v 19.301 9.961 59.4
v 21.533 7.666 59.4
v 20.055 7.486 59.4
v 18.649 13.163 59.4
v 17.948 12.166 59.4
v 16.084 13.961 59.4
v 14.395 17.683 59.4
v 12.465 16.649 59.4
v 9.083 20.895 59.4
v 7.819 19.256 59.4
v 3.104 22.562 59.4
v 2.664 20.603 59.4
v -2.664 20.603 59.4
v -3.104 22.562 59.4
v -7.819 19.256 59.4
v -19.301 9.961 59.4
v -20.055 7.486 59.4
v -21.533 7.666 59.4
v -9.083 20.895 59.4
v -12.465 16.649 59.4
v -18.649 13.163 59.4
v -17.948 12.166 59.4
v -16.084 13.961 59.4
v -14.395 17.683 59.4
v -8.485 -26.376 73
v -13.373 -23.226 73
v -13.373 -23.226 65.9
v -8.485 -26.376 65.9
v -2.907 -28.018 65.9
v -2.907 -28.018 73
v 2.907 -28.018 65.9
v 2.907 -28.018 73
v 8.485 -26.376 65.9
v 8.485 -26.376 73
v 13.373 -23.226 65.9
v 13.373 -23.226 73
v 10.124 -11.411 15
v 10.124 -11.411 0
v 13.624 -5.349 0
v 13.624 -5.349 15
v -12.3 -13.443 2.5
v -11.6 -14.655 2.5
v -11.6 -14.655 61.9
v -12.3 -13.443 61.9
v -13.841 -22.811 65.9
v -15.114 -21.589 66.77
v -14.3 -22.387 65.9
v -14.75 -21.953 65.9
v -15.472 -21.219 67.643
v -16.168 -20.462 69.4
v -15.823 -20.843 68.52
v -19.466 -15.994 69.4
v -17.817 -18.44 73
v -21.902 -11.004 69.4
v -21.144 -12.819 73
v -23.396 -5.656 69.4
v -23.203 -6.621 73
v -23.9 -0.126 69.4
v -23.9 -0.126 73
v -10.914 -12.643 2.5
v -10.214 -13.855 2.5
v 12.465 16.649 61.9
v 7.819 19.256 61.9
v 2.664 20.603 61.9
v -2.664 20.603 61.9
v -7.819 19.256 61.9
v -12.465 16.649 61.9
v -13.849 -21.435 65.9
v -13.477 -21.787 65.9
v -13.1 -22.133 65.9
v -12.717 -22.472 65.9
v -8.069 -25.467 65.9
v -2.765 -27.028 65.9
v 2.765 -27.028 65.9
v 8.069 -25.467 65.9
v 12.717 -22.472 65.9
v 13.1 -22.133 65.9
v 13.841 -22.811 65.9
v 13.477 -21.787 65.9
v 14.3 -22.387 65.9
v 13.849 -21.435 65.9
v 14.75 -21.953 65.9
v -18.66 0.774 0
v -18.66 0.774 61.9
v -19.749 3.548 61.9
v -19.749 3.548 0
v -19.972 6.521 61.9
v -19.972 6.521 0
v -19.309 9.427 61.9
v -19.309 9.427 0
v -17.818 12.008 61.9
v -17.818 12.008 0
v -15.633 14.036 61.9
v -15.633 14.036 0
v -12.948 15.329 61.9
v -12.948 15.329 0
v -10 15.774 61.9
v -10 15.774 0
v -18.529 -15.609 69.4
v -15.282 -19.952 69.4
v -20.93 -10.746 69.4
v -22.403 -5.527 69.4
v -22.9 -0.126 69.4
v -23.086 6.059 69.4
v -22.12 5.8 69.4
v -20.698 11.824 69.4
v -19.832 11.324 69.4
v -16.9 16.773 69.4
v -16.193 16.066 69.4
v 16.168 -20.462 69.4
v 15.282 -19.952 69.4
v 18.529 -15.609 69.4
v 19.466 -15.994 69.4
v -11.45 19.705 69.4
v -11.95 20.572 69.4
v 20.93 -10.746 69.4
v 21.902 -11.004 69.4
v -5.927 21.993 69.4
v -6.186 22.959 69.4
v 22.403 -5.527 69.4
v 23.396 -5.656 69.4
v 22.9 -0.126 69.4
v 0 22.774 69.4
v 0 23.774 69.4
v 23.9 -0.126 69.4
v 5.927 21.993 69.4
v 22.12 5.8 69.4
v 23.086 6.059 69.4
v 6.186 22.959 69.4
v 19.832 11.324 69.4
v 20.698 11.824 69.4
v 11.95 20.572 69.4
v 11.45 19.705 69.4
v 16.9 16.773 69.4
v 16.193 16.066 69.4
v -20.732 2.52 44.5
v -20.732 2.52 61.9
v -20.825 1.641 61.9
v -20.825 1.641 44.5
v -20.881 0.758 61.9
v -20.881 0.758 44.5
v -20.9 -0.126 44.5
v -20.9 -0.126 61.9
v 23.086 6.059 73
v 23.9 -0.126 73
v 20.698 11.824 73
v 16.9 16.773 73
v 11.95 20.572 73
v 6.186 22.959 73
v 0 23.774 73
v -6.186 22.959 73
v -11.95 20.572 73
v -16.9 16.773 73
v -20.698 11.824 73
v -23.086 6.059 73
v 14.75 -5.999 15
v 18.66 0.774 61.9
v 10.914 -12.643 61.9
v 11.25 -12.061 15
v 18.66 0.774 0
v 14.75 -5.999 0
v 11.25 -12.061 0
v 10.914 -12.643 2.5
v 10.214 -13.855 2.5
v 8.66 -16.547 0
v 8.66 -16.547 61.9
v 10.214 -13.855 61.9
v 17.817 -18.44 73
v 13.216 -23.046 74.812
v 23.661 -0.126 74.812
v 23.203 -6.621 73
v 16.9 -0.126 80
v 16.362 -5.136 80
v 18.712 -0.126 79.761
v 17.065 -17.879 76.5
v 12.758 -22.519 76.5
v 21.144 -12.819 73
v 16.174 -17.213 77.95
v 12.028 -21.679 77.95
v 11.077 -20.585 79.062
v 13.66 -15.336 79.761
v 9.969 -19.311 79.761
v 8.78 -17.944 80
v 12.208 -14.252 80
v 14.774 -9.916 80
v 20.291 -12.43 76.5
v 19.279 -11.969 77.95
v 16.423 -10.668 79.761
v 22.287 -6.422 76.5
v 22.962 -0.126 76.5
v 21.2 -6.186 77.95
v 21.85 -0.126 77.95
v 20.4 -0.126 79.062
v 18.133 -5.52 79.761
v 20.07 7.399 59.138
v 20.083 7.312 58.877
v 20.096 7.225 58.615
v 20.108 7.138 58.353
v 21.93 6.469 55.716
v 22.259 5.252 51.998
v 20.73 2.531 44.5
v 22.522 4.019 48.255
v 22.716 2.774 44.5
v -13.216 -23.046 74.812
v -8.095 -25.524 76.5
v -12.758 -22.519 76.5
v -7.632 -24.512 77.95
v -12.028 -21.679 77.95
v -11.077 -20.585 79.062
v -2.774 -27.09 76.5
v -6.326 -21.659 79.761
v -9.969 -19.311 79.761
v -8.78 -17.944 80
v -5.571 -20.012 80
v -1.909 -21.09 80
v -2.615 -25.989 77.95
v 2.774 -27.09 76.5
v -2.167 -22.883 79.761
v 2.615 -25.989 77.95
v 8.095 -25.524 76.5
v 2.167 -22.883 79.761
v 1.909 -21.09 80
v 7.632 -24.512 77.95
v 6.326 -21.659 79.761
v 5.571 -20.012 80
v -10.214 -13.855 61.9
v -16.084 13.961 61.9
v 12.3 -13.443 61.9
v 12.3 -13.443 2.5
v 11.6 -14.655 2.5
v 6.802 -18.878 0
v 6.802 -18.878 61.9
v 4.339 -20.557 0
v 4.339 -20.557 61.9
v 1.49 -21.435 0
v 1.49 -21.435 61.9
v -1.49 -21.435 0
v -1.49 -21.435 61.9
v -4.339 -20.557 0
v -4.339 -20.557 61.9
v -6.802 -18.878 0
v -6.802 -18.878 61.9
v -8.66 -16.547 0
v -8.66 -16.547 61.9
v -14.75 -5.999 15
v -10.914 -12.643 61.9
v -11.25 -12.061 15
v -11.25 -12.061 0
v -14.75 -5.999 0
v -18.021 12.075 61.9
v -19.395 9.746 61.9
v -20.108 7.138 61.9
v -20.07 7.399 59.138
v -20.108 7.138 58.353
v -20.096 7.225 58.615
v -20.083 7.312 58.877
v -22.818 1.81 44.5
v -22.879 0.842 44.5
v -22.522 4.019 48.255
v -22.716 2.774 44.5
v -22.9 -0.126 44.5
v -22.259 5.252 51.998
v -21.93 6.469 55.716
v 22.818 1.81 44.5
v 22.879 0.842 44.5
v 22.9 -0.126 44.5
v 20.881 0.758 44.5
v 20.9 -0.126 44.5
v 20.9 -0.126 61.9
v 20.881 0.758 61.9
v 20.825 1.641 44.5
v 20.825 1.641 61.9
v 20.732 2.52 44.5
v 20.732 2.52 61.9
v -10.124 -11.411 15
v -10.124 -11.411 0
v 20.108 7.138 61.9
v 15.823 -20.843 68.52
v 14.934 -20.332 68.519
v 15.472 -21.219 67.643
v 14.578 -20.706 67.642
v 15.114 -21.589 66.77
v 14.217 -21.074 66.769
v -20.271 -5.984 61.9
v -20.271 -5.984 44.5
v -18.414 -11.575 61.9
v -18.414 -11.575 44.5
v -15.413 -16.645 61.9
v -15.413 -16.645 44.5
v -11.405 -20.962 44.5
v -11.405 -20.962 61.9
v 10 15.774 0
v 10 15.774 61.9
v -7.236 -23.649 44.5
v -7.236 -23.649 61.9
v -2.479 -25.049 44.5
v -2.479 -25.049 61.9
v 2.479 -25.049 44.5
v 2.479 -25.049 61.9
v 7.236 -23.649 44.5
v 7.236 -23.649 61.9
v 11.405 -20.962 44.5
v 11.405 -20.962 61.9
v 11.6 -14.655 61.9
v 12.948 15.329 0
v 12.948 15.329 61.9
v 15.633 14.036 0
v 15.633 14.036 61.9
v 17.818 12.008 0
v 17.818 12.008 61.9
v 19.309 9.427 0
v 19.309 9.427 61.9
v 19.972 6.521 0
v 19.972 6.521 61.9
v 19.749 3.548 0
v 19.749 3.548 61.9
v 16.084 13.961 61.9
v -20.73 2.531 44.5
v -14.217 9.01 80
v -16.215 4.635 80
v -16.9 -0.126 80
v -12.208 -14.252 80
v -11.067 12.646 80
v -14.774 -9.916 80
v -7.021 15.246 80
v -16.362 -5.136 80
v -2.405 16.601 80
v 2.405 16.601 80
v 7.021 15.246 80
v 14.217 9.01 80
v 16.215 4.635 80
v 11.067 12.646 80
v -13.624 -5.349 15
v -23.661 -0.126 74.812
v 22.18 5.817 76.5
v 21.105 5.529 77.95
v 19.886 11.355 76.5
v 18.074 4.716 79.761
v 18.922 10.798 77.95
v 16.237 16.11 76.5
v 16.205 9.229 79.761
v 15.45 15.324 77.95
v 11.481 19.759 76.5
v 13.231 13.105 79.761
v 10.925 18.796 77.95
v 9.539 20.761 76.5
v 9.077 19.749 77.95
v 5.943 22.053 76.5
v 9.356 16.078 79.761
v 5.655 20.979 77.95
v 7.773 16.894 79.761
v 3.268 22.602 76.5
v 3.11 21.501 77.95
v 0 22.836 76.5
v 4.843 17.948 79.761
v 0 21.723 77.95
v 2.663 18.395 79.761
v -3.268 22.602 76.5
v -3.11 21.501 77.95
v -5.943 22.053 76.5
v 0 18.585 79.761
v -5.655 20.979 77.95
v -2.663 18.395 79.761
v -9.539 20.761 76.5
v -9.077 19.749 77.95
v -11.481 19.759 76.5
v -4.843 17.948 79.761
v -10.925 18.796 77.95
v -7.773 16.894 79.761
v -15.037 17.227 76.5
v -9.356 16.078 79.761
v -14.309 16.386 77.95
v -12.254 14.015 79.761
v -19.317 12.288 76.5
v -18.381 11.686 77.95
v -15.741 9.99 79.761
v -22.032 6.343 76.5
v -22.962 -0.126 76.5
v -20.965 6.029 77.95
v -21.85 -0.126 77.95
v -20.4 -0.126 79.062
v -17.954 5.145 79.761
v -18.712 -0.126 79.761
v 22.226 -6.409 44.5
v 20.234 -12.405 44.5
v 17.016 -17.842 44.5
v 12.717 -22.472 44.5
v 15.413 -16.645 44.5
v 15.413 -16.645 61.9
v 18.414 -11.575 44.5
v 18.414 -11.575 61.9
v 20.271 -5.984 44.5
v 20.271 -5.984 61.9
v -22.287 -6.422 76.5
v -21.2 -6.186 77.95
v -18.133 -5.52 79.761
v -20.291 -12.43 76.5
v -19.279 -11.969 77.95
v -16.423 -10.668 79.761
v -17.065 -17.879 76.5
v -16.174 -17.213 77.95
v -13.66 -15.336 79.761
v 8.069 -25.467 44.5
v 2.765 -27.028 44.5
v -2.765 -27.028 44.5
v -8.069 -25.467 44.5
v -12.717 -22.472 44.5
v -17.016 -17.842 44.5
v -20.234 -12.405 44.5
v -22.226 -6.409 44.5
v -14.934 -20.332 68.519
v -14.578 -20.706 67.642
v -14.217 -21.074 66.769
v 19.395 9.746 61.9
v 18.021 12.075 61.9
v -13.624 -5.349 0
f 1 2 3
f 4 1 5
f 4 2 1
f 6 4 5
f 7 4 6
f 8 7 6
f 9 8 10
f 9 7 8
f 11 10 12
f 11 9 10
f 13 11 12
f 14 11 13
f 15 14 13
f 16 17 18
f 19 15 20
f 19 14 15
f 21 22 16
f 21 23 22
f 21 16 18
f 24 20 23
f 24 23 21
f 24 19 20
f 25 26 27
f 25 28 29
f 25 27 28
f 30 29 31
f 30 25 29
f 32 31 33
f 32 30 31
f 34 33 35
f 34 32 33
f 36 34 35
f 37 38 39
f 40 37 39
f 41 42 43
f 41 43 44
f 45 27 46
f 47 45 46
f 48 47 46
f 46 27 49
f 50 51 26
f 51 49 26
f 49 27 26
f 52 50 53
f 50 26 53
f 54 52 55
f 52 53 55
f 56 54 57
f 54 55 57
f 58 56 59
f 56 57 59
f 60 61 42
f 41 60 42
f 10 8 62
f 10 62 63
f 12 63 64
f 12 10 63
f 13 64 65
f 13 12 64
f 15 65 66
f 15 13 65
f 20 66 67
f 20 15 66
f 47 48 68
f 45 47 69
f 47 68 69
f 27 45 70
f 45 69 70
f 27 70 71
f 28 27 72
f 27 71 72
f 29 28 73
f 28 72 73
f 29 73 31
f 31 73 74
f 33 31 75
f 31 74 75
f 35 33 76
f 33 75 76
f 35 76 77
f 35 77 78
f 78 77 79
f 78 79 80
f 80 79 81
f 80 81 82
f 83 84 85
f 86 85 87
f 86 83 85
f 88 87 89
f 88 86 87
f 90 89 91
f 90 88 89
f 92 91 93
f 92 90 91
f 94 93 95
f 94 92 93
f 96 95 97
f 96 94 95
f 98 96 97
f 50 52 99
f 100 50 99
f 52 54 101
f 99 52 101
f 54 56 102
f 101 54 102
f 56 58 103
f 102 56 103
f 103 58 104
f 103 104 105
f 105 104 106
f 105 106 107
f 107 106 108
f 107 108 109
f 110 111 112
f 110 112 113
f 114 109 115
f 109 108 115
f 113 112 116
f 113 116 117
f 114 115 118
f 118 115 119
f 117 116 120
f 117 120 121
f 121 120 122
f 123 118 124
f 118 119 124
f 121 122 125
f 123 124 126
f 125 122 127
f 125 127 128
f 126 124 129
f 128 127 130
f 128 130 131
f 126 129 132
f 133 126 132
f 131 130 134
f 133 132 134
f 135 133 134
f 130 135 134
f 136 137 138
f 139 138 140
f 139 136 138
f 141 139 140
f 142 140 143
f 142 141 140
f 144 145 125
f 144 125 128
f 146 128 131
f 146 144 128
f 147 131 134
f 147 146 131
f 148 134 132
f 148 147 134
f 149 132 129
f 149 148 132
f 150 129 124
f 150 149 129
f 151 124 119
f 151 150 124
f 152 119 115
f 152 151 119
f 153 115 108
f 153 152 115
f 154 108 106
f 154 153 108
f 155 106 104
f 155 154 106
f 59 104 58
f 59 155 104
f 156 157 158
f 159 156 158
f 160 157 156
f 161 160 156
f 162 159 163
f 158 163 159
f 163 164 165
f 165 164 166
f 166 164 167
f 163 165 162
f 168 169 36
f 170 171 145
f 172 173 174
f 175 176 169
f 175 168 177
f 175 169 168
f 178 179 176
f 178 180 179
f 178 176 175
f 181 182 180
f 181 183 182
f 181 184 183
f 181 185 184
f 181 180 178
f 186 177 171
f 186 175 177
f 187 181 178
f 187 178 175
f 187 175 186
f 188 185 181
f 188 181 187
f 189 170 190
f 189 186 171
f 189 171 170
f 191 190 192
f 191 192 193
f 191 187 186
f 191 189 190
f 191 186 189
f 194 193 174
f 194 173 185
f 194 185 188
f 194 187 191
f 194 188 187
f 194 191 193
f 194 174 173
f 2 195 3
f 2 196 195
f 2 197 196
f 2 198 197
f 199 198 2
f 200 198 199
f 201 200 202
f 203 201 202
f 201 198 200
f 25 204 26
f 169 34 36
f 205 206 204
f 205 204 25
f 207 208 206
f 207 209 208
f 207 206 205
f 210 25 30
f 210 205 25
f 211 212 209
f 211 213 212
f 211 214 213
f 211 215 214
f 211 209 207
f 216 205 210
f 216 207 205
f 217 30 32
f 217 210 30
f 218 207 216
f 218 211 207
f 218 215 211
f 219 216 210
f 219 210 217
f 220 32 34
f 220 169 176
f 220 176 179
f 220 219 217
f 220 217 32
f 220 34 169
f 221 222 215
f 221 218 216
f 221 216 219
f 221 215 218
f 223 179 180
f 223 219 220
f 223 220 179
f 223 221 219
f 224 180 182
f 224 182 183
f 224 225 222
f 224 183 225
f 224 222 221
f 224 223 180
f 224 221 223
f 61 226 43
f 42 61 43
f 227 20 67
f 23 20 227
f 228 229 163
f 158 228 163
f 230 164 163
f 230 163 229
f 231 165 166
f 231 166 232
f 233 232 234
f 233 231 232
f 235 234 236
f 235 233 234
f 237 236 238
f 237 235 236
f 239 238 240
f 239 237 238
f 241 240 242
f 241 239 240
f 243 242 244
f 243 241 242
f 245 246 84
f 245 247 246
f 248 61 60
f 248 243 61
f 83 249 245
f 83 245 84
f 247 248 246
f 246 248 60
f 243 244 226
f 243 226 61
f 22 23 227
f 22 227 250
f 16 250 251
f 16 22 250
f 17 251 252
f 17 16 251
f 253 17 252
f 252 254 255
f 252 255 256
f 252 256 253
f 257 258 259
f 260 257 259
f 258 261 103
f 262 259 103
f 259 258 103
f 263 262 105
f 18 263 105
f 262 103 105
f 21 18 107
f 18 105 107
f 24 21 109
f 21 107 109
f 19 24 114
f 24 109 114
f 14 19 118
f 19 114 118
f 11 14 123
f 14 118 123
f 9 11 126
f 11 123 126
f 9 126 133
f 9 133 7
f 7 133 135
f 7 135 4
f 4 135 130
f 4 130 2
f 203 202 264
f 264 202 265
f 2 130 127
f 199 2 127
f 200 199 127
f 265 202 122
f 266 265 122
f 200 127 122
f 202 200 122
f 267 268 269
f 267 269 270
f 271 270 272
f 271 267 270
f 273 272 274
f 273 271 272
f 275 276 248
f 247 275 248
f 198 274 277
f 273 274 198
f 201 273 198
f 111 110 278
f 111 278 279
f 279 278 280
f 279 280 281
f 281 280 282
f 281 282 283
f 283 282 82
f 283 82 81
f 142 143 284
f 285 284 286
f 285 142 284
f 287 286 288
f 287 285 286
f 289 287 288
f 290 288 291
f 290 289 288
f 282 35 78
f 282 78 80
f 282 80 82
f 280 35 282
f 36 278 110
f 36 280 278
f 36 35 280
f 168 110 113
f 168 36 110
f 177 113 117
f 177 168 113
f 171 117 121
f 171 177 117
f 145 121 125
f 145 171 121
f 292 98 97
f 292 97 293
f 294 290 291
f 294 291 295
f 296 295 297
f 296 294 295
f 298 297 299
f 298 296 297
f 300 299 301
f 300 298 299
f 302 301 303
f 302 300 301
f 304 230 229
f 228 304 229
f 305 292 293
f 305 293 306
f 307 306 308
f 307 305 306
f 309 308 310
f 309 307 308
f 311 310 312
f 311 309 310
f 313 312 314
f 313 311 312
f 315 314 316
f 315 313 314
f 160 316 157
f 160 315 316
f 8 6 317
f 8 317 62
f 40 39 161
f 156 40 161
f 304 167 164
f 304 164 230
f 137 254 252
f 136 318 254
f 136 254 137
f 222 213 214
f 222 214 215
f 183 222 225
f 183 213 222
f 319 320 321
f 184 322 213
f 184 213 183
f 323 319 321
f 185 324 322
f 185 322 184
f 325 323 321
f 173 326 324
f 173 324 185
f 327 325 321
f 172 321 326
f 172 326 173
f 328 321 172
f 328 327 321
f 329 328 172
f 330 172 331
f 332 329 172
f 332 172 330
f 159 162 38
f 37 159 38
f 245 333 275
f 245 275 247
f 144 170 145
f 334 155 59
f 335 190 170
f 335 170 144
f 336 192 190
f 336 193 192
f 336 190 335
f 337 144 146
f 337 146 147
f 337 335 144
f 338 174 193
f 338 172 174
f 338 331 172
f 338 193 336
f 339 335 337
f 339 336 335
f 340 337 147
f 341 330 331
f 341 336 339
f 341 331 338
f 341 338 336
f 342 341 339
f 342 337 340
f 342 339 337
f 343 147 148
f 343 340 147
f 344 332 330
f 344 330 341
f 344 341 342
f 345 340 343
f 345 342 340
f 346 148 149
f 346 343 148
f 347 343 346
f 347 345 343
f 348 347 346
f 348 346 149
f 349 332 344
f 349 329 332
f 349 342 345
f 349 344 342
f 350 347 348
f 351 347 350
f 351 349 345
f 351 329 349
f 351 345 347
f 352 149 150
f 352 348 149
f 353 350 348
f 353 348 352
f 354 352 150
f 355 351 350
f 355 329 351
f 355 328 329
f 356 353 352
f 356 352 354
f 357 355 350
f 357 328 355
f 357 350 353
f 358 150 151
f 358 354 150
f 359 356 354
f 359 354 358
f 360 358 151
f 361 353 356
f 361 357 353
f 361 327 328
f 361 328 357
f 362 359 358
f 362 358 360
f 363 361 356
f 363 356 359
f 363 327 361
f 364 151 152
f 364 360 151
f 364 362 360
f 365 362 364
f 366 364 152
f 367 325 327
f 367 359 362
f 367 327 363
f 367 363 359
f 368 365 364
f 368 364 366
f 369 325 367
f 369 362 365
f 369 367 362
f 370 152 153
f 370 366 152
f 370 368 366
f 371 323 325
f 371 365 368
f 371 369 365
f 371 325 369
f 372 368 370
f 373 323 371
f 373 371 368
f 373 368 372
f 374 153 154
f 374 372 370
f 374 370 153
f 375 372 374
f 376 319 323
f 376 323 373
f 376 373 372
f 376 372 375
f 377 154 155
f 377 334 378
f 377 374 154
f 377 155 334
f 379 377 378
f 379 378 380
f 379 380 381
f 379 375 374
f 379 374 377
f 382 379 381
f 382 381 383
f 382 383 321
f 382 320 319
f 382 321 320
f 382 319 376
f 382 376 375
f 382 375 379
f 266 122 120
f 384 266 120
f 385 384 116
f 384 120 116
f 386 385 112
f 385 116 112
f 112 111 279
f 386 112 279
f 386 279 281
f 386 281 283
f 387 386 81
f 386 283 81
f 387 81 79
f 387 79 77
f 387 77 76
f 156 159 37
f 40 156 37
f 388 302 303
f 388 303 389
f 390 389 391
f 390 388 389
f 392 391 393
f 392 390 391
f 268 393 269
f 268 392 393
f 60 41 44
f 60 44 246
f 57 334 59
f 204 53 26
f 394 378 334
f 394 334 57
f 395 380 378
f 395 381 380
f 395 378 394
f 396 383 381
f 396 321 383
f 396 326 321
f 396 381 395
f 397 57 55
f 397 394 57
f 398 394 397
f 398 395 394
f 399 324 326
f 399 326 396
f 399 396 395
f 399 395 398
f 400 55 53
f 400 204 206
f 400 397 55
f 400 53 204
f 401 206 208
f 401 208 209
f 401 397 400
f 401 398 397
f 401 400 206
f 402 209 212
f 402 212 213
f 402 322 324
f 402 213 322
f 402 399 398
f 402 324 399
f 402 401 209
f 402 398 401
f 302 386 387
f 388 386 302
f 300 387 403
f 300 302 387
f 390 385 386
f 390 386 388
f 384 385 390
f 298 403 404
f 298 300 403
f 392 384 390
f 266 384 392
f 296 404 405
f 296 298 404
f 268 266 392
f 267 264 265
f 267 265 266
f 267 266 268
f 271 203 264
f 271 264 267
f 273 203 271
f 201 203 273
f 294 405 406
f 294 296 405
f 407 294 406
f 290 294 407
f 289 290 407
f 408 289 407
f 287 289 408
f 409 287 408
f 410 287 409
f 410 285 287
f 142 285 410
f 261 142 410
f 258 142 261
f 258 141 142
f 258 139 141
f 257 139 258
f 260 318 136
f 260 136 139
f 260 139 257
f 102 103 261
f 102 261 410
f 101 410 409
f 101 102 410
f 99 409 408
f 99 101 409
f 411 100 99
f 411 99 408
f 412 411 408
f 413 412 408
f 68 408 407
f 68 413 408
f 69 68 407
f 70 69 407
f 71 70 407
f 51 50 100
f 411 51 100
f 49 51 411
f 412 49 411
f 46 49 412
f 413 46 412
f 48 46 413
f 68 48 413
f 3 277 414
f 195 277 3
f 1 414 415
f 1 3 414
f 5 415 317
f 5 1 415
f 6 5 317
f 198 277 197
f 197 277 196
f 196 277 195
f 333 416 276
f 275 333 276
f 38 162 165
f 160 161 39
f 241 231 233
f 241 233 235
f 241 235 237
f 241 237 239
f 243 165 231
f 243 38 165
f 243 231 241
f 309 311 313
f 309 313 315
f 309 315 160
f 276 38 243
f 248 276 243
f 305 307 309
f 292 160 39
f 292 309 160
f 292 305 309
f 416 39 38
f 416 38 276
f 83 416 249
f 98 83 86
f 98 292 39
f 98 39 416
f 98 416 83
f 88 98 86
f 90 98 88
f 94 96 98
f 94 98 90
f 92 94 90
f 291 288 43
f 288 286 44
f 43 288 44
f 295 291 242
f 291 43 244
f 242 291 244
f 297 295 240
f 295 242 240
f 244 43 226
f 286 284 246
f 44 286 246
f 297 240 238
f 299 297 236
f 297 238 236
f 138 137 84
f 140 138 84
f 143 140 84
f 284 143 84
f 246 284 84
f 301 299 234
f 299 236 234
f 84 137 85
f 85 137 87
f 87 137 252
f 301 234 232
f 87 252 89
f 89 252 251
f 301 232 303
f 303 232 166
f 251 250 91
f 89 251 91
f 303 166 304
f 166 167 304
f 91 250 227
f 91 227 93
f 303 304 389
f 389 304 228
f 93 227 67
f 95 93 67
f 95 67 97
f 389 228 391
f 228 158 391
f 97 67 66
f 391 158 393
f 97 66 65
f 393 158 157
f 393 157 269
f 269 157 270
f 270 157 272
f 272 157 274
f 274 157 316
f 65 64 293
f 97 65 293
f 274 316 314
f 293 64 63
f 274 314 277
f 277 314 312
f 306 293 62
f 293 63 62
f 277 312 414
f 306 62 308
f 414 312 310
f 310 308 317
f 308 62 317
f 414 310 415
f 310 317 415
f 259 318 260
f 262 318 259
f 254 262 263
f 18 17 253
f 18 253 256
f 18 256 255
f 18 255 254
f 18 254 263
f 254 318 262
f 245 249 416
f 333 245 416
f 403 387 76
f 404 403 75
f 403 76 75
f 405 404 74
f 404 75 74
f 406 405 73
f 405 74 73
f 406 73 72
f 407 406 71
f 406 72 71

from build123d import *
from OCP.BRepFilletAPI import BRepFilletAPI_MakeChamfer

# Parameters (mm, degrees)
BOSS_EXTRU_1_DEPTH      = 80
BOSS_EXTRU_2_DEPTH      = 10.6
BOSS_EXTRU_3_DEPTH      = 10
BOSS_EXTRU_4_DEPTH      = 3.5
CHANFREIN1_SIZE         = 2
CHANFREIN1_SIZE_2       = 3.5
BOSS_EXTRU_5_DEPTH      = 14.9
CHANFREIN2_SIZE         = 5
CHANFREIN2_SIZE_2       = 14.9
ENL_V_MAT_EXTRU_1_DEPTH = 61.9
BOSS_EXTRU_8_REACH      = 92.636
BOSS_EXTRU_8_START      = -2.5
ENL_V_MAT_EXTRU_4_DEPTH = 15
CONG_1_R                = 7


with BuildPart() as part:
    # Esquisse1 → Boss.-Extru.1 (new body)
    with BuildSketch(Plane.XY):
        with BuildLine():
            Line((-9.999999999999973, 15.773502691896244), (9.999999999999973, 15.773502691896244))
            ThreePointArc((9.999999999999973, 15.773502691896244), (18.66025403784436, 10.773502691896228), (18.66025403784438, 0.7735026918962024))
            Line((18.66025403784438, 0.7735026918962024), (8.660254037844393, -16.54700538379251))
            ThreePointArc((8.660254037844393, -16.54700538379251), (-4.87e-15, -21.5470053837925), (-8.660254037844393, -16.54700538379251))
            Line((-8.660254037844393, -16.54700538379251), (-18.66025403784438, 0.7735026918962024))
            ThreePointArc((-18.66025403784438, 0.7735026918962024), (-18.66025403784441, 10.773502691896235), (-9.999999999999973, 15.773502691896244))
        make_face()
    extrude(amount=BOSS_EXTRU_1_DEPTH)

    # Esquisse2 → Boss.-Extru.2 (add)
    with BuildSketch(Plane.XY.offset(80)):
        with BuildLine():
            Line((0, 23.773502691896258), (0, -28.226497308103742))
            ThreePointArc((0, -28.226497308103742), (-7.138520611844601, -26.935621886911633), (-13.372879499304581, -23.22649730810374))
            ThreePointArc((-13.372879499304581, -23.22649730810374), (-21.14415675858487, -12.819312855059437), (-23.89999999999999, -0.12649730810374363))
            ThreePointArc((-23.89999999999999, -0.12649730810374363), (-16.89985207035848, 16.773354762254744), (0, 23.773502691896258))
        make_face()
    boss_extru_2 = extrude(amount=-BOSS_EXTRU_2_DEPTH)

    # Symétrie1: Boss.-Extru.2 across plane
    add(boss_extru_2.mirror(Plane(origin=(0, 0, 0), x_dir=(0, 0, 1), z_dir=(1, 0, 0))))

    # Esquisse4 → Boss.-Extru.3 (add)
    with BuildSketch(Plane(origin=(0, 0, 69.4), x_dir=(-1, 0, 0), z_dir=(0, 0, -1))):
        with BuildLine():
            ThreePointArc((-12.716812029717252, -22.471795065262707), (-2.04e-15, -27.226497308103735), (12.71681202971725, -22.4717950652627))
            ThreePointArc((12.71681202971725, -22.4717950652627), (20.2341931687673, -12.404624700892555), (22.899999999999995, -0.12649730810373652))
            ThreePointArc((22.899999999999995, -0.12649730810373652), (-6.91e-15, 22.773502691896258), (-22.899999999999995, -0.12649730810373735))
            ThreePointArc((-22.899999999999995, -0.12649730810373735), (-20.234193168767305, -12.404624700892553), (-12.716812029717252, -22.471795065262707))
        make_face()
    extrude(amount=BOSS_EXTRU_3_DEPTH)

    # Esquisse6 → Boss.-Extru.4 (add)
    with BuildSketch(Plane(origin=(0, 0, 69.4), x_dir=(-1, 0, 0), z_dir=(0, 0, -1))):
        with BuildLine():
            Line((14.75, -21.95321690393977), (0, -13.476497308103742))
            Line((0, -13.476497308103742), (0, -28.226497308103742))
            ThreePointArc((0, -28.226497308103742), (7.138520611844594, -26.935621886911633), (13.372879499304576, -23.226497308103735))
            ThreePointArc((13.372879499304576, -23.226497308103735), (14.071194795630928, -22.600407707254973), (14.75, -21.95321690393977))
        make_face()
    boss_extru_4 = extrude(amount=BOSS_EXTRU_4_DEPTH)

    # Symétrie2: Boss.-Extru.4 across plane
    add(boss_extru_4.mirror(Plane(origin=(0, 0, 0), x_dir=(0, 0, 1), z_dir=(1, 0, 0))))

    # Chanfrein1
    chanfrein1_edges_1 = [part.edges().sort_by_distance(p)[0] for p in [
        (-14.299309891443901, -21.69420851920438, 69.4),
    ]]
    chanfrein1_side_1 = [part.faces().sort_by_distance(p)[0] for p in [
        (-14.319240730556658, -21.659527664943543, 69.4),
    ]]
    chanfrein1_edges_2 = [part.edges().sort_by_distance(p)[0] for p in [
        (14.299309891443906, -21.694208519204384, 69.4),
    ]]
    chanfrein1_side_2 = [part.faces().sort_by_distance(p)[0] for p in [
        (14.319240730556663, -21.659527664943546, 69.4),
    ]]
    chanfrein1 = BRepFilletAPI_MakeChamfer(part.part.solid().wrapped)
    for e in chanfrein1_edges_1:
        chanfrein1.Add(CHANFREIN1_SIZE - 0.0001, CHANFREIN1_SIZE_2 - 0.0001, e.wrapped, chanfrein1_side_1[0].wrapped)
    for e in chanfrein1_edges_2:
        chanfrein1.Add(CHANFREIN1_SIZE - 0.0001, CHANFREIN1_SIZE_2 - 0.0001, e.wrapped, chanfrein1_side_2[0].wrapped)
    add(Compound.cast(chanfrein1.Shape()), mode=Mode.REPLACE)  # a hair under: the kernel refuses the full size

    # Esquisse7 → Boss.-Extru.5 (add)
    with BuildSketch(Plane(origin=(0, 0, 59.4), x_dir=(-1, 0, 0), z_dir=(0, 0, -1))):
        with BuildLine():
            Line((-6.79e-15, -27.22649730810374), (0, 0))
            Line((0, 0), (22.71563338320109, 2.7735026918962267))
            ThreePointArc((22.71563338320109, 2.7735026918962267), (22.853861867037974, 1.3264299999015228), (22.899999999999995, -0.12649730810374016))
            ThreePointArc((22.899999999999995, -0.12649730810374016), (20.2341931687673, -12.404624700892562), (12.716812029717245, -22.471795065262707))
            ThreePointArc((12.716812029717245, -22.471795065262707), (6.788307992740876, -25.998951656029643), (-6.79e-15, -27.22649730810374))
        make_face()
    boss_extru_5 = extrude(amount=BOSS_EXTRU_5_DEPTH)

    # Symétrie4: Boss.-Extru.5 across plane
    add(boss_extru_5.mirror(Plane(origin=(0, 0, 0), x_dir=(0, 0, 1), z_dir=(1, 0, 0))))

    # Chanfrein2
    chanfrein2_edges_1 = [part.edges().sort_by_distance(p)[0] for p in [
        (21.059128460282075, 2.5712489935136453, 59.4),
    ]]
    chanfrein2_side_1 = [part.faces().sort_by_distance(p)[0] for p in [
        (21.04700879877706, 2.6705118456034573, 59.4),
    ]]
    chanfrein2_edges_2 = [part.edges().sort_by_distance(p)[0] for p in [
        (-21.059128460282082, 2.571248993513646, 59.4),
    ]]
    chanfrein2_side_2 = [part.faces().sort_by_distance(p)[0] for p in [
        (-21.059128460282082, 2.571248993513646, 59.3),
    ]]
    chanfrein2 = BRepFilletAPI_MakeChamfer(part.part.solid().wrapped)
    for e in chanfrein2_edges_1:
        chanfrein2.Add(CHANFREIN2_SIZE - 0.0001, CHANFREIN2_SIZE_2 - 0.0001, e.wrapped, chanfrein2_side_1[0].wrapped)
    for e in chanfrein2_edges_2:
        chanfrein2.Add(CHANFREIN2_SIZE_2 - 0.0001, CHANFREIN2_SIZE - 0.0001, e.wrapped, chanfrein2_side_2[0].wrapped)
    add(Compound.cast(chanfrein2.Shape()), mode=Mode.REPLACE)  # a hair under: the kernel refuses the full size

    # Esquisse8 → Enlèv. mat.-Extru.1 (cut)
    with BuildSketch(Plane(origin=(0, 0, 0), x_dir=(-1, 0, 0), z_dir=(0, 0, -1))):
        with BuildLine():
            Line((-20.73173527113113, 2.5202275827259273), (-20.108299540895768, 7.138156637600371))
            ThreePointArc((-20.108299540895768, 7.138156637600371), (-18.785258977060302, 10.95609130242486), (-16.08354229758742, 13.96071913666333))
            Line((-16.08354229758742, 13.96071913666333), (-12.465297452899778, 16.64926972087978))
            ThreePointArc((-12.465297452899778, 16.64926972087978), (8.34e-15, 20.773502691896244), (12.465297452899788, 16.649269720879765))
            Line((12.465297452899788, 16.649269720879765), (16.083542297587456, 13.96071913666329))
            ThreePointArc((16.083542297587456, 13.96071913666329), (18.78525897706036, 10.956091302424788), (20.108299540895814, 7.13815663760026))
            Line((20.108299540895814, 7.13815663760026), (20.73173527113112, 2.5202275827259264))
            ThreePointArc((20.73173527113112, 2.5202275827259264), (20.857891398301028, 1.1995367852285772), (20.89999999999999, -0.12649730810373677))
            ThreePointArc((20.89999999999999, -0.12649730810373677), (18.414265989132176, -11.5752483925588), (11.404677090542576, -20.962390579580656))
            ThreePointArc((11.404677090542576, -20.962390579580656), (1.69e-15, -25.226497308103735), (-11.40467709054258, -20.962390579580664))
            ThreePointArc((-11.40467709054258, -20.962390579580664), (-18.414265989132176, -11.575248392558798), (-20.89999999999999, -0.1264973081037376))
            ThreePointArc((-20.89999999999999, -0.1264973081037376), (-20.85789139830103, 1.1995367852285768), (-20.73173527113113, 2.5202275827259273))
        make_face()
        with BuildLine():
            Line((-18.66025403784436, 0.773502691896218), (-8.660254037844393, -16.54700538379251))
            ThreePointArc((-8.660254037844393, -16.54700538379251), (6.09e-15, -21.547005383792524), (8.660254037844393, -16.54700538379251))
            Line((8.660254037844393, -16.54700538379251), (18.66025403784438, 0.7735026918962024))
            ThreePointArc((18.66025403784438, 0.7735026918962024), (18.66025403784438, 10.773502691896217), (9.999999999999973, 15.773502691896226))
            Line((9.999999999999973, 15.773502691896226), (-9.999999999999973, 15.773502691896244))
            ThreePointArc((-9.999999999999973, 15.773502691896244), (-18.660254037844357, 10.77350269189623), (-18.66025403784436, 0.773502691896218))
        make_face(mode=Mode.SUBTRACT)
    extrude(amount=-ENL_V_MAT_EXTRU_1_DEPTH, mode=Mode.SUBTRACT)

    # Esquisse9 → Boss.-Extru.8 (add, up to next)
    with BuildSketch(Plane(origin=(0, 0, 0), x_dir=(-1, 0, 0), z_dir=(0, 0, -1)).offset(BOSS_EXTRU_8_START), mode=Mode.PRIVATE) as boss_extru_8_sk1:
        Polygon((-10.214359353944898, -13.855216015993522), (-11.599999999999998, -14.655216015993522), (-12.3, -13.442780450695311), (-10.914359353944906, -12.642780450695314), align=None)
    boss_extru_8_tool1 = extrude(boss_extru_8_sk1.sketch, amount=-BOSS_EXTRU_8_REACH, mode=Mode.PRIVATE) - part.part
    # Esquisse9 → Boss.-Extru.8 (add, up to next)
    with BuildSketch(Plane(origin=(0, 0, 0), x_dir=(-1, 0, 0), z_dir=(0, 0, -1)).offset(BOSS_EXTRU_8_START), mode=Mode.PRIVATE) as boss_extru_8_sk2:
        Polygon((10.914359353944906, -12.642780450695314), (10.214359353944898, -13.855216015993522), (11.599999999999998, -14.655216015993522), (12.3, -13.442780450695311), align=None)
    boss_extru_8_tool2 = extrude(boss_extru_8_sk2.sketch, amount=-BOSS_EXTRU_8_REACH, mode=Mode.PRIVATE) - part.part
    add(boss_extru_8_tool1.solids().sort_by_distance((11.25718, -13.648998, 2.5))[0])
    add(boss_extru_8_tool2.solids().sort_by_distance((-11.25718, -13.648998, 2.5))[0])

    # Esquisse10 → Enlèv. mat.-Extru.4 (cut)
    with BuildSketch(Plane(origin=(0, 0, 0), x_dir=(-1, 0, 0), z_dir=(0, 0, -1))):
        Polygon((-11.249999999999988, -12.061433798642668), (-10.124166975080218, -11.411433798642664), (-13.624166975080218, -5.349255972151593), (-14.74999999999999, -5.999255972151601), align=None)
        Polygon((11.250000000000012, -12.061433798642668), (14.750000000000009, -5.9992559721515955), (13.624166975080241, -5.349255972151597), (10.124166975080241, -11.411433798642667), align=None)
    extrude(amount=-ENL_V_MAT_EXTRU_4_DEPTH, mode=Mode.SUBTRACT)

    # Congé1
    cong_1_edges = [part.edges().sort_by_distance(p)[0] for p in [
        (-1.79e-15, 23.773502691896258, 80),
        (-21.144156758584863, -12.819312855059447, 80),
        (6.22e-15, -28.226497308103745, 80),
        (21.144156758584863, -12.819312855059447, 80),
    ]]
    fillet(cong_1_edges, radius=CONG_1_R)


solid = part.part
